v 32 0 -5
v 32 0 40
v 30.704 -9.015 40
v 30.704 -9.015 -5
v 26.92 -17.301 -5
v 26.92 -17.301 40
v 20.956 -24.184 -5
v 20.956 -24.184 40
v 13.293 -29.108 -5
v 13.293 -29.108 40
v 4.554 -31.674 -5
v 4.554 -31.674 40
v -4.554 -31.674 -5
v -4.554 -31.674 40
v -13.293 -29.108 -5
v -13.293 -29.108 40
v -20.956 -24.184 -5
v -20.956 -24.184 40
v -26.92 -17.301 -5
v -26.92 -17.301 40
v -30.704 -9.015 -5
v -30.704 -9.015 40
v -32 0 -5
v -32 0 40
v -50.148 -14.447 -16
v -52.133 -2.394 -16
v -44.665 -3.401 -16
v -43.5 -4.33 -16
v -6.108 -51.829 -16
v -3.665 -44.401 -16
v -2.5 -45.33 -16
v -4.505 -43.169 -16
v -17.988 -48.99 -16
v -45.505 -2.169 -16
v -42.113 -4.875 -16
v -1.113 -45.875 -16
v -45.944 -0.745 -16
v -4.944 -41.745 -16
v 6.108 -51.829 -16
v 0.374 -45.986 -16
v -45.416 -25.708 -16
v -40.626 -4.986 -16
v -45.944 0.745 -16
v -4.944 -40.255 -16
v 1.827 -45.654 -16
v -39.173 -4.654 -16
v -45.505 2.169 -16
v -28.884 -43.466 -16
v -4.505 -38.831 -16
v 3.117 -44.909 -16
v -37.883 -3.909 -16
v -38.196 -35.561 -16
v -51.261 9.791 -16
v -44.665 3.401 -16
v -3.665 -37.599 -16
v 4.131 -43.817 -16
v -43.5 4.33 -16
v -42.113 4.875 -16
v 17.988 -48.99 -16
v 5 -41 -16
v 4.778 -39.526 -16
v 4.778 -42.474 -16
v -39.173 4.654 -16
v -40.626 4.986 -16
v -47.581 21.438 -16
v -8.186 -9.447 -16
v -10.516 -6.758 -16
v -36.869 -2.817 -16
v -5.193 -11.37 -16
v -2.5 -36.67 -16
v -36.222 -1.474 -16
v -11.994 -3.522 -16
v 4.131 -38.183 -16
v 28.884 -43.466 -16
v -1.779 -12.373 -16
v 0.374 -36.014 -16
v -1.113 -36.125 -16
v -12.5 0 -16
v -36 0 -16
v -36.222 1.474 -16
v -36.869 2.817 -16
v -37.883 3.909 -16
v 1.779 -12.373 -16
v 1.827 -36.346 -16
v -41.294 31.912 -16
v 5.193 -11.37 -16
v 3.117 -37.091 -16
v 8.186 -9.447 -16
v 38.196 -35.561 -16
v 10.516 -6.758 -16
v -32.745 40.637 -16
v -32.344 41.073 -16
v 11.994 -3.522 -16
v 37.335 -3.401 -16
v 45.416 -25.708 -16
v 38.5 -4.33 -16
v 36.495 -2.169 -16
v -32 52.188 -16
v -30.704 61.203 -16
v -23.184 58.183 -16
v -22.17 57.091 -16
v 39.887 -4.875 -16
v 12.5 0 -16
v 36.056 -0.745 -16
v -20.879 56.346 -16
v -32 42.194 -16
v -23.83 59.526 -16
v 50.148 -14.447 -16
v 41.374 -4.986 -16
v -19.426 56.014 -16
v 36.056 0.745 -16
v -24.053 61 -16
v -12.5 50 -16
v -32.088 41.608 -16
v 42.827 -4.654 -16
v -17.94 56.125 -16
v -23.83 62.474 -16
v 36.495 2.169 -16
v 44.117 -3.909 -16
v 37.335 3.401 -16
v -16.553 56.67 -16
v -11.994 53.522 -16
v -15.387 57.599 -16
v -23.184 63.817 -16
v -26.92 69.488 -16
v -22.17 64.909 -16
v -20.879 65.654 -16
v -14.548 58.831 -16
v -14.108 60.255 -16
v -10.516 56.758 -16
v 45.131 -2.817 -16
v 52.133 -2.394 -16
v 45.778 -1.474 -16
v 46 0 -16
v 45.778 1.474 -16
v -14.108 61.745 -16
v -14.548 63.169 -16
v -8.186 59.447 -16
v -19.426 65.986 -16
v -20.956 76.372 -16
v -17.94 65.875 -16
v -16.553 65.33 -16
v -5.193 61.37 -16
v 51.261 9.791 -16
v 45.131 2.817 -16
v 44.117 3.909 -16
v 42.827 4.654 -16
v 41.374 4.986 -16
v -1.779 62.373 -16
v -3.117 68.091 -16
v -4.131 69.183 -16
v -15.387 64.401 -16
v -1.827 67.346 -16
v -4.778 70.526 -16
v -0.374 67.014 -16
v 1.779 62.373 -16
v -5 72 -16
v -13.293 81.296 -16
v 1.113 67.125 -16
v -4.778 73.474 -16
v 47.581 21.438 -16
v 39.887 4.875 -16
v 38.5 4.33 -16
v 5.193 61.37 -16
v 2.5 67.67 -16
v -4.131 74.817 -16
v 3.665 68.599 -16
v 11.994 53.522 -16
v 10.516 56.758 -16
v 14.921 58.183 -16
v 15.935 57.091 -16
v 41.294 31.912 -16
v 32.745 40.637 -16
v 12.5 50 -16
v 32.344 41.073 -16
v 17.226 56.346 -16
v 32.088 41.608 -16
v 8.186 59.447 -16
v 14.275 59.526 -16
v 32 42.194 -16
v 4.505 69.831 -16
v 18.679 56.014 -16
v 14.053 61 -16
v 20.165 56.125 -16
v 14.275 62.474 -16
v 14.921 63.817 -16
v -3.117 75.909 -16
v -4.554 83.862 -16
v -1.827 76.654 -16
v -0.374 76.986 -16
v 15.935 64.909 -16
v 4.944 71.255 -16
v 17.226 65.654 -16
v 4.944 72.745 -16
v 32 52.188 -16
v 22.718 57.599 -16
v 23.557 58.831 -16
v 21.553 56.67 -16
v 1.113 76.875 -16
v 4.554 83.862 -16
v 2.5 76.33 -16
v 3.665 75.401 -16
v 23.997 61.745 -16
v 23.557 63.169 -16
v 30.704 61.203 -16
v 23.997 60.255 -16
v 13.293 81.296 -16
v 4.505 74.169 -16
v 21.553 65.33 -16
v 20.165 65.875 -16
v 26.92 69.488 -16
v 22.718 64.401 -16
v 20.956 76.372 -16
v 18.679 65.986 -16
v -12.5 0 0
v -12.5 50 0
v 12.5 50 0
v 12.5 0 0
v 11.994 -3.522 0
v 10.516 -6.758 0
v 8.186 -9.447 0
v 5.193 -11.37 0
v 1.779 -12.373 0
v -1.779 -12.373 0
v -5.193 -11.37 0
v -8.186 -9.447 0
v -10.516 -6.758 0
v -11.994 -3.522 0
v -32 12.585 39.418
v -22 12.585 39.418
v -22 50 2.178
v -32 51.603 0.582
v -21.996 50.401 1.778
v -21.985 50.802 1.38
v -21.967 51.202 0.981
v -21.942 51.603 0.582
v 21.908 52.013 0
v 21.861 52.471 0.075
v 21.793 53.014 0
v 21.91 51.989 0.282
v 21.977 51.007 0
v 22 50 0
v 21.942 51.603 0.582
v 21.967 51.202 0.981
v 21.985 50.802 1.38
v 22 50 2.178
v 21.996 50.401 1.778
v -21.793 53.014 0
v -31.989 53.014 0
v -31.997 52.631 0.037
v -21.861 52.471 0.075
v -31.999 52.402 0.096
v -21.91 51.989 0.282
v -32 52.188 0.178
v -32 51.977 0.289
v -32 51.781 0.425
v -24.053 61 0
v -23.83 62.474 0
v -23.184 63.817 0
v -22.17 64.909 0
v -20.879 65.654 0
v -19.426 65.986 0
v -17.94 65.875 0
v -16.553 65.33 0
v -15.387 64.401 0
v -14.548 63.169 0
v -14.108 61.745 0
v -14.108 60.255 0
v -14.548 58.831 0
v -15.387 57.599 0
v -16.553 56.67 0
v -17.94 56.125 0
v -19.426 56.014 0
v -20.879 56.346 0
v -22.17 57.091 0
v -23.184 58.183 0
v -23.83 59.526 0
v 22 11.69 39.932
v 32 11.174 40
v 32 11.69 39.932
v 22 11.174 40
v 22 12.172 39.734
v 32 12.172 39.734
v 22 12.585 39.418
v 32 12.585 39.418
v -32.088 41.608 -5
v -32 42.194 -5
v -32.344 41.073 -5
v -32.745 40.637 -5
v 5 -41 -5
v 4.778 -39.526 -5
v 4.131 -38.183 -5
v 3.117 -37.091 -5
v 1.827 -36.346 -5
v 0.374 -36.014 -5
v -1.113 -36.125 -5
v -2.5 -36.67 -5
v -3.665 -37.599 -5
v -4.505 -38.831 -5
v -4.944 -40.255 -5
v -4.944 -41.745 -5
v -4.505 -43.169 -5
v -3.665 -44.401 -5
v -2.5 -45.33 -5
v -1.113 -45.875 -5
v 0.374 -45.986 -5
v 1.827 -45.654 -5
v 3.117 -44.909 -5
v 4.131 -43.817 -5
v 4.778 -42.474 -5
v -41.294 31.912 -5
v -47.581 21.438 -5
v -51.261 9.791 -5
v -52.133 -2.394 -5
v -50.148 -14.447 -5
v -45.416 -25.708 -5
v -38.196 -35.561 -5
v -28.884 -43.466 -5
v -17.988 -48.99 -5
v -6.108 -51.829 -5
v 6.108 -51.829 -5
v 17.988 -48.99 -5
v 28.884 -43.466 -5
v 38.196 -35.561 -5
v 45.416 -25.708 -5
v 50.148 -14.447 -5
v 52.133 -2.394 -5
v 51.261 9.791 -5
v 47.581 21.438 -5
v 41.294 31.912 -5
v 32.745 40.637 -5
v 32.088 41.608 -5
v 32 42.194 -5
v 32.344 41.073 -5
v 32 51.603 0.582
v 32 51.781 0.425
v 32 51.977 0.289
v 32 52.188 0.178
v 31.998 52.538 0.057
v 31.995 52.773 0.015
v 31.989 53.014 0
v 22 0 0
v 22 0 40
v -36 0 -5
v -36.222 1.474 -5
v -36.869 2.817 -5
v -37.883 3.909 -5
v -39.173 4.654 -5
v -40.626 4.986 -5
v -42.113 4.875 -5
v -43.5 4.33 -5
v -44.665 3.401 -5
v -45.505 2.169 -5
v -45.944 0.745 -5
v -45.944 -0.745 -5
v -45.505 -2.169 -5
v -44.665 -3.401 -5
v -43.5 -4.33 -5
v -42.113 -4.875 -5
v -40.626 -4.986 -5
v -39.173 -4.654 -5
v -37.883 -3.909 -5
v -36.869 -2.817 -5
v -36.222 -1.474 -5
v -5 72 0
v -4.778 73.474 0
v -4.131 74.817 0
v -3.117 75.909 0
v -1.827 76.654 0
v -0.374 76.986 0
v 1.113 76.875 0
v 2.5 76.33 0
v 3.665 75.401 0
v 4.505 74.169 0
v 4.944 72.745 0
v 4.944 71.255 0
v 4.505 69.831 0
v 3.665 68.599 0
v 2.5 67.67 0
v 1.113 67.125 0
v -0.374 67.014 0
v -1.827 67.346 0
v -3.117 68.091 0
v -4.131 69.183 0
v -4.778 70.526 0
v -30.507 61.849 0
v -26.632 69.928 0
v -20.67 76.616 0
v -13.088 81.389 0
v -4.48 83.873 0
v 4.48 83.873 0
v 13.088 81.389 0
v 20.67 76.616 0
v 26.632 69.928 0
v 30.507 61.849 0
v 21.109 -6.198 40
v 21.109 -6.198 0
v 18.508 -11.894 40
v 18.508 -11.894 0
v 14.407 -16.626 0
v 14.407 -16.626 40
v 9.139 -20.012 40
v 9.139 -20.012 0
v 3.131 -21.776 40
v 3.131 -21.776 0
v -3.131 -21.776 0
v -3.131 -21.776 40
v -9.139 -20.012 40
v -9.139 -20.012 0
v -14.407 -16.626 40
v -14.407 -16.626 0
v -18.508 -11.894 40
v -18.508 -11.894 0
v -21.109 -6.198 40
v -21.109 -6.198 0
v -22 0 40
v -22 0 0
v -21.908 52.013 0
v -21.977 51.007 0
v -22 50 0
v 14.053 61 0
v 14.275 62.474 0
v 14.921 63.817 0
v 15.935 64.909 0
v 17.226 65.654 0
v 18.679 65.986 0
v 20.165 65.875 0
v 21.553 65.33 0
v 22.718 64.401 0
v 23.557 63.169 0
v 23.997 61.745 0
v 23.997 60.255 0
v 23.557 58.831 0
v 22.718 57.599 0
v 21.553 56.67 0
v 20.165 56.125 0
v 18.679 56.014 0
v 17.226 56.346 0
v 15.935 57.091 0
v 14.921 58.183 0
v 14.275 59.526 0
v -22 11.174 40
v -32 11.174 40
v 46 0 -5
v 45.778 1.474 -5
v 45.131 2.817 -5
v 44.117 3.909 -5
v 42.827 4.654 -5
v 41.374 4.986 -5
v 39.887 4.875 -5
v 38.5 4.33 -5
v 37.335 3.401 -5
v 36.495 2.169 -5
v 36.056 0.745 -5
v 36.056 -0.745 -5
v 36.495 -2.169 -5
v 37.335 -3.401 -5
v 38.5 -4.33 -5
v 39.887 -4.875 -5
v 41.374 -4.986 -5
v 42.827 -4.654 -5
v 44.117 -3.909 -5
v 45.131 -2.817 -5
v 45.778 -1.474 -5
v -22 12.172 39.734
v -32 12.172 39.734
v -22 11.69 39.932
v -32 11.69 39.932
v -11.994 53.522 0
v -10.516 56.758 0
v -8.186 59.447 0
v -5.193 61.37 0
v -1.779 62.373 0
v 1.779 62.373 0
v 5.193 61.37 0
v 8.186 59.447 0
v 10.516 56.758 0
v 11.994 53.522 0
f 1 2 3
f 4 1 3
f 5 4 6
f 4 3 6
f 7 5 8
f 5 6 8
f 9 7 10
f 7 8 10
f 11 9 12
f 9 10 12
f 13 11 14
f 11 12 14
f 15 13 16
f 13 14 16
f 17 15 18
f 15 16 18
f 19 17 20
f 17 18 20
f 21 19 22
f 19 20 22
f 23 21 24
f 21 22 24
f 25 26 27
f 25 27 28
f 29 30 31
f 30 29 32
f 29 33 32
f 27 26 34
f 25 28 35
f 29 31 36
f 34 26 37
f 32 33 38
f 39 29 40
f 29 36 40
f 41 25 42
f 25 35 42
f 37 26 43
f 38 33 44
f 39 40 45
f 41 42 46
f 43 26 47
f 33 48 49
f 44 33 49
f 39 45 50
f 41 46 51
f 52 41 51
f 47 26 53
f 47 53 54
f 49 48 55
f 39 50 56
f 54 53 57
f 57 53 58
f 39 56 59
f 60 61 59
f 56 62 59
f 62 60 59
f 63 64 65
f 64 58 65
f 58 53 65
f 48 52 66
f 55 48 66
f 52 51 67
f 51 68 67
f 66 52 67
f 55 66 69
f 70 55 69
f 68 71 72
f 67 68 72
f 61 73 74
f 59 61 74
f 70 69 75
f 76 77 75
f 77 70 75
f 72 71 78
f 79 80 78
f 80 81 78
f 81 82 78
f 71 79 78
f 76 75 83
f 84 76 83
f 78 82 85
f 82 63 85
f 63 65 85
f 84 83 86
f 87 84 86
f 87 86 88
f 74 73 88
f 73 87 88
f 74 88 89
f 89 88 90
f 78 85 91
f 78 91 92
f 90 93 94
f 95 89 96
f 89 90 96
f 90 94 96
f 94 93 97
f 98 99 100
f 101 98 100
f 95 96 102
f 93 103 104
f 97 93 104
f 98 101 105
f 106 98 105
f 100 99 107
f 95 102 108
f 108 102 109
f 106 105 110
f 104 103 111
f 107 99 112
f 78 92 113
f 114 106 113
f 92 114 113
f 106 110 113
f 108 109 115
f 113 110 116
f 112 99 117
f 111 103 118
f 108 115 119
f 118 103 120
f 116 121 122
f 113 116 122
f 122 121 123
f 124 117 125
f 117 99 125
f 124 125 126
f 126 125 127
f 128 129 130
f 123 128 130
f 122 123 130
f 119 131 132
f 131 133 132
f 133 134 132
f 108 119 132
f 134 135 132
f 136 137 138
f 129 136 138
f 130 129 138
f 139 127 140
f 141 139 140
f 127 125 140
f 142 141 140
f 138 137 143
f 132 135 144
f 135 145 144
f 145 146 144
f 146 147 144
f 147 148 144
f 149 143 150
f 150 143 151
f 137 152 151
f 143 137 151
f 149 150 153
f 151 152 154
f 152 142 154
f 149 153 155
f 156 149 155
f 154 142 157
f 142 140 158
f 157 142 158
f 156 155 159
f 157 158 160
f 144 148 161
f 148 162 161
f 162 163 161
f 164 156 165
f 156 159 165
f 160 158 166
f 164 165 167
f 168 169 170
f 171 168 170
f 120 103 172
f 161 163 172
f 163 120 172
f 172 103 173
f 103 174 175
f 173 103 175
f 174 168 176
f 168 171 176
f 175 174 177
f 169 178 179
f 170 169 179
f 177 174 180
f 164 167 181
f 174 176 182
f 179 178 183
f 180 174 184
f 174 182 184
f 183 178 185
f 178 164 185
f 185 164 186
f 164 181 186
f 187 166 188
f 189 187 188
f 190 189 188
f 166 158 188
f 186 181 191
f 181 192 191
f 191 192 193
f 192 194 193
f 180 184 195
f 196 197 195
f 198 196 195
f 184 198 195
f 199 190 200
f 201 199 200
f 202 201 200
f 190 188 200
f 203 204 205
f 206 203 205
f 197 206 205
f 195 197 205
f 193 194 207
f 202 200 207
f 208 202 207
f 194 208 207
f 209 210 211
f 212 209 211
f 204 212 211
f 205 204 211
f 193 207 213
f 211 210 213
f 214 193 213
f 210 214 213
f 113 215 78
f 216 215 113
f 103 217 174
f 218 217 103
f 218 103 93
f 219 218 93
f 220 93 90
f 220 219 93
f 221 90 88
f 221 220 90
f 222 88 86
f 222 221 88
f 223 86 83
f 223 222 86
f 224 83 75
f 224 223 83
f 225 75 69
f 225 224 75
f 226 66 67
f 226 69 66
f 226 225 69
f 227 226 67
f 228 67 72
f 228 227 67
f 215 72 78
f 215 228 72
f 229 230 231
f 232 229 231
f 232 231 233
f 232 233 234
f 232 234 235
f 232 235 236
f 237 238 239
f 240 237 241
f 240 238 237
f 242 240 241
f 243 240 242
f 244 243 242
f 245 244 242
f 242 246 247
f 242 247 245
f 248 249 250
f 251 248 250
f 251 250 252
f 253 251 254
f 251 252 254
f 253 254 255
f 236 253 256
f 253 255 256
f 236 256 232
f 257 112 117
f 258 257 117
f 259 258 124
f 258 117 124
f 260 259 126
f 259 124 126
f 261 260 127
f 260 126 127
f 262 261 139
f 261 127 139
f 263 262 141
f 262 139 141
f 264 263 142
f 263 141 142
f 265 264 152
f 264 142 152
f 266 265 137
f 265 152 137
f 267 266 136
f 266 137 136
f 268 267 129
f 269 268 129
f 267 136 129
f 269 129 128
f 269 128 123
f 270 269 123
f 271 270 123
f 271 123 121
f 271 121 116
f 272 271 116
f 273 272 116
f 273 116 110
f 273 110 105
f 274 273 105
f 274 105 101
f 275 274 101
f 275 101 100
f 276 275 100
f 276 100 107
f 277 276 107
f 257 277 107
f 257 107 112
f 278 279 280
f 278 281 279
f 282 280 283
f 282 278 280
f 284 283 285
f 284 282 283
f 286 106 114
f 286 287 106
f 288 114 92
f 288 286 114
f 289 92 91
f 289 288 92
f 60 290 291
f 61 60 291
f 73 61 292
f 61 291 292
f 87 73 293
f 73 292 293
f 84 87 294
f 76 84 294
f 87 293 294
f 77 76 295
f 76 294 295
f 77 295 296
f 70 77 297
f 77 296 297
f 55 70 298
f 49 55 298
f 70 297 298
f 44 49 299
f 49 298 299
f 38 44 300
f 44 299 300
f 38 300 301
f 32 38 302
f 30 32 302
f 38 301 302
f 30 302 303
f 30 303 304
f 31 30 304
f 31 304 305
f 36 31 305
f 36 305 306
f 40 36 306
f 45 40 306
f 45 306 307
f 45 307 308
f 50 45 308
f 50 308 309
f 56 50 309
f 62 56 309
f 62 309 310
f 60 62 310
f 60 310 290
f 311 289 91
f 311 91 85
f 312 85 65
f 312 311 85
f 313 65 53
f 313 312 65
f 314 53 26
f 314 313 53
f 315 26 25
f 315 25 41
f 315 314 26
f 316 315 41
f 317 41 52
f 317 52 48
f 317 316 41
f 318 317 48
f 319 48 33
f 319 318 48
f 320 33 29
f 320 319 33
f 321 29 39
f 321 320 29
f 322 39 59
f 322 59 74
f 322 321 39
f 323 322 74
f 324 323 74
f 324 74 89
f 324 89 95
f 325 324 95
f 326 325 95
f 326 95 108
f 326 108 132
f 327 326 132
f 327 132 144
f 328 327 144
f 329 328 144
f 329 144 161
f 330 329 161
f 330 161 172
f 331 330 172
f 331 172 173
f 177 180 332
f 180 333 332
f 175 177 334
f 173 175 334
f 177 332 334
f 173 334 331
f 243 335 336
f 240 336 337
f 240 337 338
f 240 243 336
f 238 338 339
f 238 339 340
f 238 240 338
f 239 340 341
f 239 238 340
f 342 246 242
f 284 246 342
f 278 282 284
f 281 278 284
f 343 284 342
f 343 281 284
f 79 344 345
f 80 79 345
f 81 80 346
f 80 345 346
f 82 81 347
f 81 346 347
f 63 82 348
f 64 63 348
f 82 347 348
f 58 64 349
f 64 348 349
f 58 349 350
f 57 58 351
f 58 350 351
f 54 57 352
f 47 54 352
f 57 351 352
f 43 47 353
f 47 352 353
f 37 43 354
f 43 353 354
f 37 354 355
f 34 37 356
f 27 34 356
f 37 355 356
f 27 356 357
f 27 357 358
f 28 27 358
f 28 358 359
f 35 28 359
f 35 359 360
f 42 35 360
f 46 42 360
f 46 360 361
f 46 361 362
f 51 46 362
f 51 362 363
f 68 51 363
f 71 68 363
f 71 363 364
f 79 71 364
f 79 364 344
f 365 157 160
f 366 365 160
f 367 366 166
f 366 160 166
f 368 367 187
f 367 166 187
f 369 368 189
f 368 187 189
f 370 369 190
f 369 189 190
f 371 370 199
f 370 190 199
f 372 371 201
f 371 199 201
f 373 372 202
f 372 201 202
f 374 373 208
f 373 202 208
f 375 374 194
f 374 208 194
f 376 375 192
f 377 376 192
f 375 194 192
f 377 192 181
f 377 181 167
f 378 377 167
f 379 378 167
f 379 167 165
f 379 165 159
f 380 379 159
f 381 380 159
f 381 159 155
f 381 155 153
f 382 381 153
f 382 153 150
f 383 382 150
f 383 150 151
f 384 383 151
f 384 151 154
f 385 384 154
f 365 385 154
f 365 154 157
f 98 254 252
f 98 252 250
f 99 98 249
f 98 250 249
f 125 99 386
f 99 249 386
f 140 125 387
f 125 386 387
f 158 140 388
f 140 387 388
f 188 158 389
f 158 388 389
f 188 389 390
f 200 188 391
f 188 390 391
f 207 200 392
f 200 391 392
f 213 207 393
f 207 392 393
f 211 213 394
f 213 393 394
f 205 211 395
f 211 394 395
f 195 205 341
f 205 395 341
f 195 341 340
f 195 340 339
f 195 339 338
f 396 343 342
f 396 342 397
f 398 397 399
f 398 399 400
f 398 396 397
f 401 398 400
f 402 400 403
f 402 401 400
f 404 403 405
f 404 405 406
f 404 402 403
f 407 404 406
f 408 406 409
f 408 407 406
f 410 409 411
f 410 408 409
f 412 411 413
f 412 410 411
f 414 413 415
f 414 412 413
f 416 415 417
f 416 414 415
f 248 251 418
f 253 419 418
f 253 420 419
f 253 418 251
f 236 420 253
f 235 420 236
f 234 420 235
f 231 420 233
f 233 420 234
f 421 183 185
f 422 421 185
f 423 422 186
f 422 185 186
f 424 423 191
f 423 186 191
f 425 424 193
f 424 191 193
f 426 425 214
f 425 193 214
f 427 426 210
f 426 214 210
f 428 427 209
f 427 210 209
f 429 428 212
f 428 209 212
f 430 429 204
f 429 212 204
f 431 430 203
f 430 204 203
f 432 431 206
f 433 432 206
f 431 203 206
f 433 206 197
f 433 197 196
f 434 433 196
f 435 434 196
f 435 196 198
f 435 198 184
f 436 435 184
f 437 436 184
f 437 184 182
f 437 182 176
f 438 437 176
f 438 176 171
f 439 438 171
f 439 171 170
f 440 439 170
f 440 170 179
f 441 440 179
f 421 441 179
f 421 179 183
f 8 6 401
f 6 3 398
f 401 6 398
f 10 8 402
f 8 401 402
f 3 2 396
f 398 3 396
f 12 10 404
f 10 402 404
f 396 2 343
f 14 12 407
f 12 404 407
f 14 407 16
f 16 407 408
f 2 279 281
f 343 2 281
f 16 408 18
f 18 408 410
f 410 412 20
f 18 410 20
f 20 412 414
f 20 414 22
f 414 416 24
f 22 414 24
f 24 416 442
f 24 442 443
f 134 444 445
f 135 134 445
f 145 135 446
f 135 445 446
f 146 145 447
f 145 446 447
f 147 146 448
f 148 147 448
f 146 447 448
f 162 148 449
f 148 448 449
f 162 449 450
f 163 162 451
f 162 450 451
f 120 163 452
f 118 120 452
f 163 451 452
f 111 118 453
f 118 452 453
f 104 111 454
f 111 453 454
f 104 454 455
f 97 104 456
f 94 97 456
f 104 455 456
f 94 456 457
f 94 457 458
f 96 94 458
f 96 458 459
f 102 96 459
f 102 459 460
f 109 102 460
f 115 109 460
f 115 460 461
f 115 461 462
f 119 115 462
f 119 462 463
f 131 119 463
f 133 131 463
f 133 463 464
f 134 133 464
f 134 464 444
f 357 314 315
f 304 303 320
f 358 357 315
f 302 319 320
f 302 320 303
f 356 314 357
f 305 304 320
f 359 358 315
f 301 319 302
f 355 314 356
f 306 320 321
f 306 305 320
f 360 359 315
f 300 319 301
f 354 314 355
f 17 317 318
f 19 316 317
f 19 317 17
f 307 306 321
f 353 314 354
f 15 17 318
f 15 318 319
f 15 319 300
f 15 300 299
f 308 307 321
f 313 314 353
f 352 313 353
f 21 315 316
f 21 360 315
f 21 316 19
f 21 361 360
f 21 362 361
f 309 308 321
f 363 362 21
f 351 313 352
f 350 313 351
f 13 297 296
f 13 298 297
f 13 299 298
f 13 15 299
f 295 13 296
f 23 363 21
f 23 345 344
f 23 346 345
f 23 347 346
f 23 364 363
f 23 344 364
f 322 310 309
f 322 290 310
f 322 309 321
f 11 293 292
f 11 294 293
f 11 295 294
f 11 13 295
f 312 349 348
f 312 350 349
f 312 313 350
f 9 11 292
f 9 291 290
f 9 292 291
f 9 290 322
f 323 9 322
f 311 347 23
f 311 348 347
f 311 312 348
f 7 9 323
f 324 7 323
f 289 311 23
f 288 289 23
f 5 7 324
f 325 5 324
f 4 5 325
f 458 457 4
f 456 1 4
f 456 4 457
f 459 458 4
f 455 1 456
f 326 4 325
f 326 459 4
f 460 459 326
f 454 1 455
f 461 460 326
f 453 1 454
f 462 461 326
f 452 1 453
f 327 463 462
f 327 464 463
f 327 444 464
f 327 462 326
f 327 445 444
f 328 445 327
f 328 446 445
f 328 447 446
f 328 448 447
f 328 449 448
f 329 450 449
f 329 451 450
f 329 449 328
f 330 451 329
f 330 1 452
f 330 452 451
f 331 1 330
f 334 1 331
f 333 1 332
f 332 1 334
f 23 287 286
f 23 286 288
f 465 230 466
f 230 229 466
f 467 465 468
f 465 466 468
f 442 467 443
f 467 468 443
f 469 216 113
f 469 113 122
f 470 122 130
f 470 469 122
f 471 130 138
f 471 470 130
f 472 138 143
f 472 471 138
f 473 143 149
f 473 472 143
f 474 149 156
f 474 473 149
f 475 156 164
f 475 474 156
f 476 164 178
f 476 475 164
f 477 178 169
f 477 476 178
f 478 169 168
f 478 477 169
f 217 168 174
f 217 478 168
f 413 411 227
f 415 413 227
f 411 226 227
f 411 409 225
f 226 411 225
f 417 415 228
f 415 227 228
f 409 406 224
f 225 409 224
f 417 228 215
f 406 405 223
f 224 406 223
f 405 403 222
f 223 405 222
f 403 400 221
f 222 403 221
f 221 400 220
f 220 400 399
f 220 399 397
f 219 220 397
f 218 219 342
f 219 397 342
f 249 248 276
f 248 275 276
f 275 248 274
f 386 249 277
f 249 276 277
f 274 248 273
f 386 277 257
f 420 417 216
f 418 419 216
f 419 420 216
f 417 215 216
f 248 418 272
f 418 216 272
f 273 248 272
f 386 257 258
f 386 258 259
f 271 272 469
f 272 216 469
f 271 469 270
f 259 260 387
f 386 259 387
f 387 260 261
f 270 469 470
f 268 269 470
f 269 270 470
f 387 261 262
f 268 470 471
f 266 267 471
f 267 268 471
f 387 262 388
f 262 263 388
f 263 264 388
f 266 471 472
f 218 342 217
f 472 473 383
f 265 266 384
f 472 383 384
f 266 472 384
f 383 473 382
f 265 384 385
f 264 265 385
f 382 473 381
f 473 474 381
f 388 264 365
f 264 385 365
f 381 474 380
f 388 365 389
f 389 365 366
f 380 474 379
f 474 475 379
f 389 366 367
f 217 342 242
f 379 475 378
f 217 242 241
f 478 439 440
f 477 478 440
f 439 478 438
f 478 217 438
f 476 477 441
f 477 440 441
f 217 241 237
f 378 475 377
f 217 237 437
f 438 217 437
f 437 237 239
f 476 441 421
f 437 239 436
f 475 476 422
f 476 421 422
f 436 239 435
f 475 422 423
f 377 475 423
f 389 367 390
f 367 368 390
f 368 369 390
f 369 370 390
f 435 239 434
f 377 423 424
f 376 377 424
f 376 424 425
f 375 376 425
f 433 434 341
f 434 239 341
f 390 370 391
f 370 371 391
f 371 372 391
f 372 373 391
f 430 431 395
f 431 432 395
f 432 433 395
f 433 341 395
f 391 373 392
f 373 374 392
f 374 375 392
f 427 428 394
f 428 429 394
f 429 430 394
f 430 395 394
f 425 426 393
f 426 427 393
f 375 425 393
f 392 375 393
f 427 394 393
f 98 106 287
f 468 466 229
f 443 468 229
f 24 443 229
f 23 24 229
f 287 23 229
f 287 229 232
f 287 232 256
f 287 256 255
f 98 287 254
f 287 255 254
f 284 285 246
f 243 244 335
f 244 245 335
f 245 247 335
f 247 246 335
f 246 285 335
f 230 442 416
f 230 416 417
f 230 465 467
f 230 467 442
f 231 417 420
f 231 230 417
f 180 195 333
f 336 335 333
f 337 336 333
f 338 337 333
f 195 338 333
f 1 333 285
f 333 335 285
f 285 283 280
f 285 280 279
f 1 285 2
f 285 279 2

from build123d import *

# Parameters (mm, degrees)
BOSS_EXTRUDE1_DEPTH      = 40
BOSS_EXTRUDE1_DEPTH_BACK = 16
BOSS_EXTRUDE2_START      = -5
SKETCH1_3_R              = 52.187837327
BOSS_EXTRUDE2_DEPTH      = 11
CUT_EXTRUDE1_DEPTH       = 114.785598028
CUT_EXTRUDE3_DEPTH       = 40
CUT_EXTRUDE4_DEPTH       = 126.599298993
FILLET1_R                = 2
F_10_0MM_DOWEL_HOLE1_D   = 10
F_10_0MM_DOWEL_HOLE2_D   = 10
FILLET2_R                = 2
FILLET3_R                = 2


with BuildPart() as part:
    # Sketch1 → Boss-Extrude1 (new, two sides: drawn at the far end of the back side and taken through both)
    with BuildSketch(Plane.XY.offset(-BOSS_EXTRUDE1_DEPTH_BACK)):
        with BuildLine():
            ThreePointArc((-32, 0), (0, -32), (32, 0))
            Line((32, 0), (32, 52.187837327))
            ThreePointArc((32, 52.187837327), (0, 84.187837327), (-32, 52.187837327))
            Line((-32, 52.187837327), (-32, 0))
        make_face()
    extrude(amount=BOSS_EXTRUDE1_DEPTH + BOSS_EXTRUDE1_DEPTH_BACK)

    # Sketch1<3> → Boss-Extrude2 (add)
    with BuildSketch(Plane.XY.offset(BOSS_EXTRUDE2_START)):
        Circle(SKETCH1_3_R)
    extrude(amount=-BOSS_EXTRUDE2_DEPTH)

    # Sketch2 → Cut-Extrude1 (cut, through all)
    with BuildSketch(Plane.XY.offset(40)):
        with BuildLine():
            Line((-12.5, 0), (-12.5, 50))
            ThreePointArc((-12.5, 50), (0, 62.5), (12.5, 50))
            Line((12.5, 50), (12.5, 0))
            ThreePointArc((12.5, 0), (0, -12.5), (-12.5, 0))
        make_face()
    extrude(amount=-CUT_EXTRUDE1_DEPTH, mode=Mode.SUBTRACT)

    # Sketch6 → Cut-Extrude3 (cut)
    with BuildSketch(Plane.XY.offset(40)):
        with BuildLine():
            Line((-22, 0), (-22, 50))
            ThreePointArc((-22, 50), (0, 72), (22, 50))
            Line((22, 50), (22, 0))
            ThreePointArc((22, 0), (0, -22), (-22, 0))
        make_face()
    extrude(amount=-CUT_EXTRUDE3_DEPTH, mode=Mode.SUBTRACT)

    # Sketch7 → Cut-Extrude4 (cut, through all)
    with BuildSketch(Plane(origin=(32, 0, 0), x_dir=(0, 0, -1), z_dir=(1, 0, 0))):
        Polygon((0, 52.187837327), (0, 84.187837327), (-40, 84.187837327), (-40, 12), align=None)
    extrude(amount=-CUT_EXTRUDE4_DEPTH, mode=Mode.SUBTRACT)

    # Fillet1
    fillet1_edges = [part.edges().sort_by_distance(p)[0] for p in [
        (27, 12, 40),
        (-27, 12, 40),
    ]]
    fillet(fillet1_edges, radius=FILLET1_R)

    # Ø10.0mm Dowel Hole1 (through all)
    with Locations(Plane.XY):
        with Locations((-19.052558883, 61), (19.052558883, 61), (0, 72)):
            Hole(F_10_0MM_DOWEL_HOLE1_D / 2)

    # Ø10.0mm Dowel Hole2 (through all)
    with Locations(Plane(origin=(0, 0, -16), x_dir=(-1, 0, 0), z_dir=(0, 0, -1))):
        with Locations((0, -41), (41, 0), (-41, 0)):
            Hole(F_10_0MM_DOWEL_HOLE2_D / 2)

    # Fillet2
    fillet2_edges = [part.edges().sort_by_distance(p)[0] for p in [
        (26.945471299, 52.187837327, 0),
        (-26.945471299, 52.187837327, 0),
    ]]
    fillet(fillet2_edges, radius=FILLET2_R)

    # Fillet3
    fillet3_edges = [part.edges().sort_by_distance(p)[0] for p in [
        (-32, 41.225845835, -10.5),
        (32, 41.225845835, -10.5),
    ]]
    fillet(fillet3_edges, radius=FILLET3_R)


solid = part.part
